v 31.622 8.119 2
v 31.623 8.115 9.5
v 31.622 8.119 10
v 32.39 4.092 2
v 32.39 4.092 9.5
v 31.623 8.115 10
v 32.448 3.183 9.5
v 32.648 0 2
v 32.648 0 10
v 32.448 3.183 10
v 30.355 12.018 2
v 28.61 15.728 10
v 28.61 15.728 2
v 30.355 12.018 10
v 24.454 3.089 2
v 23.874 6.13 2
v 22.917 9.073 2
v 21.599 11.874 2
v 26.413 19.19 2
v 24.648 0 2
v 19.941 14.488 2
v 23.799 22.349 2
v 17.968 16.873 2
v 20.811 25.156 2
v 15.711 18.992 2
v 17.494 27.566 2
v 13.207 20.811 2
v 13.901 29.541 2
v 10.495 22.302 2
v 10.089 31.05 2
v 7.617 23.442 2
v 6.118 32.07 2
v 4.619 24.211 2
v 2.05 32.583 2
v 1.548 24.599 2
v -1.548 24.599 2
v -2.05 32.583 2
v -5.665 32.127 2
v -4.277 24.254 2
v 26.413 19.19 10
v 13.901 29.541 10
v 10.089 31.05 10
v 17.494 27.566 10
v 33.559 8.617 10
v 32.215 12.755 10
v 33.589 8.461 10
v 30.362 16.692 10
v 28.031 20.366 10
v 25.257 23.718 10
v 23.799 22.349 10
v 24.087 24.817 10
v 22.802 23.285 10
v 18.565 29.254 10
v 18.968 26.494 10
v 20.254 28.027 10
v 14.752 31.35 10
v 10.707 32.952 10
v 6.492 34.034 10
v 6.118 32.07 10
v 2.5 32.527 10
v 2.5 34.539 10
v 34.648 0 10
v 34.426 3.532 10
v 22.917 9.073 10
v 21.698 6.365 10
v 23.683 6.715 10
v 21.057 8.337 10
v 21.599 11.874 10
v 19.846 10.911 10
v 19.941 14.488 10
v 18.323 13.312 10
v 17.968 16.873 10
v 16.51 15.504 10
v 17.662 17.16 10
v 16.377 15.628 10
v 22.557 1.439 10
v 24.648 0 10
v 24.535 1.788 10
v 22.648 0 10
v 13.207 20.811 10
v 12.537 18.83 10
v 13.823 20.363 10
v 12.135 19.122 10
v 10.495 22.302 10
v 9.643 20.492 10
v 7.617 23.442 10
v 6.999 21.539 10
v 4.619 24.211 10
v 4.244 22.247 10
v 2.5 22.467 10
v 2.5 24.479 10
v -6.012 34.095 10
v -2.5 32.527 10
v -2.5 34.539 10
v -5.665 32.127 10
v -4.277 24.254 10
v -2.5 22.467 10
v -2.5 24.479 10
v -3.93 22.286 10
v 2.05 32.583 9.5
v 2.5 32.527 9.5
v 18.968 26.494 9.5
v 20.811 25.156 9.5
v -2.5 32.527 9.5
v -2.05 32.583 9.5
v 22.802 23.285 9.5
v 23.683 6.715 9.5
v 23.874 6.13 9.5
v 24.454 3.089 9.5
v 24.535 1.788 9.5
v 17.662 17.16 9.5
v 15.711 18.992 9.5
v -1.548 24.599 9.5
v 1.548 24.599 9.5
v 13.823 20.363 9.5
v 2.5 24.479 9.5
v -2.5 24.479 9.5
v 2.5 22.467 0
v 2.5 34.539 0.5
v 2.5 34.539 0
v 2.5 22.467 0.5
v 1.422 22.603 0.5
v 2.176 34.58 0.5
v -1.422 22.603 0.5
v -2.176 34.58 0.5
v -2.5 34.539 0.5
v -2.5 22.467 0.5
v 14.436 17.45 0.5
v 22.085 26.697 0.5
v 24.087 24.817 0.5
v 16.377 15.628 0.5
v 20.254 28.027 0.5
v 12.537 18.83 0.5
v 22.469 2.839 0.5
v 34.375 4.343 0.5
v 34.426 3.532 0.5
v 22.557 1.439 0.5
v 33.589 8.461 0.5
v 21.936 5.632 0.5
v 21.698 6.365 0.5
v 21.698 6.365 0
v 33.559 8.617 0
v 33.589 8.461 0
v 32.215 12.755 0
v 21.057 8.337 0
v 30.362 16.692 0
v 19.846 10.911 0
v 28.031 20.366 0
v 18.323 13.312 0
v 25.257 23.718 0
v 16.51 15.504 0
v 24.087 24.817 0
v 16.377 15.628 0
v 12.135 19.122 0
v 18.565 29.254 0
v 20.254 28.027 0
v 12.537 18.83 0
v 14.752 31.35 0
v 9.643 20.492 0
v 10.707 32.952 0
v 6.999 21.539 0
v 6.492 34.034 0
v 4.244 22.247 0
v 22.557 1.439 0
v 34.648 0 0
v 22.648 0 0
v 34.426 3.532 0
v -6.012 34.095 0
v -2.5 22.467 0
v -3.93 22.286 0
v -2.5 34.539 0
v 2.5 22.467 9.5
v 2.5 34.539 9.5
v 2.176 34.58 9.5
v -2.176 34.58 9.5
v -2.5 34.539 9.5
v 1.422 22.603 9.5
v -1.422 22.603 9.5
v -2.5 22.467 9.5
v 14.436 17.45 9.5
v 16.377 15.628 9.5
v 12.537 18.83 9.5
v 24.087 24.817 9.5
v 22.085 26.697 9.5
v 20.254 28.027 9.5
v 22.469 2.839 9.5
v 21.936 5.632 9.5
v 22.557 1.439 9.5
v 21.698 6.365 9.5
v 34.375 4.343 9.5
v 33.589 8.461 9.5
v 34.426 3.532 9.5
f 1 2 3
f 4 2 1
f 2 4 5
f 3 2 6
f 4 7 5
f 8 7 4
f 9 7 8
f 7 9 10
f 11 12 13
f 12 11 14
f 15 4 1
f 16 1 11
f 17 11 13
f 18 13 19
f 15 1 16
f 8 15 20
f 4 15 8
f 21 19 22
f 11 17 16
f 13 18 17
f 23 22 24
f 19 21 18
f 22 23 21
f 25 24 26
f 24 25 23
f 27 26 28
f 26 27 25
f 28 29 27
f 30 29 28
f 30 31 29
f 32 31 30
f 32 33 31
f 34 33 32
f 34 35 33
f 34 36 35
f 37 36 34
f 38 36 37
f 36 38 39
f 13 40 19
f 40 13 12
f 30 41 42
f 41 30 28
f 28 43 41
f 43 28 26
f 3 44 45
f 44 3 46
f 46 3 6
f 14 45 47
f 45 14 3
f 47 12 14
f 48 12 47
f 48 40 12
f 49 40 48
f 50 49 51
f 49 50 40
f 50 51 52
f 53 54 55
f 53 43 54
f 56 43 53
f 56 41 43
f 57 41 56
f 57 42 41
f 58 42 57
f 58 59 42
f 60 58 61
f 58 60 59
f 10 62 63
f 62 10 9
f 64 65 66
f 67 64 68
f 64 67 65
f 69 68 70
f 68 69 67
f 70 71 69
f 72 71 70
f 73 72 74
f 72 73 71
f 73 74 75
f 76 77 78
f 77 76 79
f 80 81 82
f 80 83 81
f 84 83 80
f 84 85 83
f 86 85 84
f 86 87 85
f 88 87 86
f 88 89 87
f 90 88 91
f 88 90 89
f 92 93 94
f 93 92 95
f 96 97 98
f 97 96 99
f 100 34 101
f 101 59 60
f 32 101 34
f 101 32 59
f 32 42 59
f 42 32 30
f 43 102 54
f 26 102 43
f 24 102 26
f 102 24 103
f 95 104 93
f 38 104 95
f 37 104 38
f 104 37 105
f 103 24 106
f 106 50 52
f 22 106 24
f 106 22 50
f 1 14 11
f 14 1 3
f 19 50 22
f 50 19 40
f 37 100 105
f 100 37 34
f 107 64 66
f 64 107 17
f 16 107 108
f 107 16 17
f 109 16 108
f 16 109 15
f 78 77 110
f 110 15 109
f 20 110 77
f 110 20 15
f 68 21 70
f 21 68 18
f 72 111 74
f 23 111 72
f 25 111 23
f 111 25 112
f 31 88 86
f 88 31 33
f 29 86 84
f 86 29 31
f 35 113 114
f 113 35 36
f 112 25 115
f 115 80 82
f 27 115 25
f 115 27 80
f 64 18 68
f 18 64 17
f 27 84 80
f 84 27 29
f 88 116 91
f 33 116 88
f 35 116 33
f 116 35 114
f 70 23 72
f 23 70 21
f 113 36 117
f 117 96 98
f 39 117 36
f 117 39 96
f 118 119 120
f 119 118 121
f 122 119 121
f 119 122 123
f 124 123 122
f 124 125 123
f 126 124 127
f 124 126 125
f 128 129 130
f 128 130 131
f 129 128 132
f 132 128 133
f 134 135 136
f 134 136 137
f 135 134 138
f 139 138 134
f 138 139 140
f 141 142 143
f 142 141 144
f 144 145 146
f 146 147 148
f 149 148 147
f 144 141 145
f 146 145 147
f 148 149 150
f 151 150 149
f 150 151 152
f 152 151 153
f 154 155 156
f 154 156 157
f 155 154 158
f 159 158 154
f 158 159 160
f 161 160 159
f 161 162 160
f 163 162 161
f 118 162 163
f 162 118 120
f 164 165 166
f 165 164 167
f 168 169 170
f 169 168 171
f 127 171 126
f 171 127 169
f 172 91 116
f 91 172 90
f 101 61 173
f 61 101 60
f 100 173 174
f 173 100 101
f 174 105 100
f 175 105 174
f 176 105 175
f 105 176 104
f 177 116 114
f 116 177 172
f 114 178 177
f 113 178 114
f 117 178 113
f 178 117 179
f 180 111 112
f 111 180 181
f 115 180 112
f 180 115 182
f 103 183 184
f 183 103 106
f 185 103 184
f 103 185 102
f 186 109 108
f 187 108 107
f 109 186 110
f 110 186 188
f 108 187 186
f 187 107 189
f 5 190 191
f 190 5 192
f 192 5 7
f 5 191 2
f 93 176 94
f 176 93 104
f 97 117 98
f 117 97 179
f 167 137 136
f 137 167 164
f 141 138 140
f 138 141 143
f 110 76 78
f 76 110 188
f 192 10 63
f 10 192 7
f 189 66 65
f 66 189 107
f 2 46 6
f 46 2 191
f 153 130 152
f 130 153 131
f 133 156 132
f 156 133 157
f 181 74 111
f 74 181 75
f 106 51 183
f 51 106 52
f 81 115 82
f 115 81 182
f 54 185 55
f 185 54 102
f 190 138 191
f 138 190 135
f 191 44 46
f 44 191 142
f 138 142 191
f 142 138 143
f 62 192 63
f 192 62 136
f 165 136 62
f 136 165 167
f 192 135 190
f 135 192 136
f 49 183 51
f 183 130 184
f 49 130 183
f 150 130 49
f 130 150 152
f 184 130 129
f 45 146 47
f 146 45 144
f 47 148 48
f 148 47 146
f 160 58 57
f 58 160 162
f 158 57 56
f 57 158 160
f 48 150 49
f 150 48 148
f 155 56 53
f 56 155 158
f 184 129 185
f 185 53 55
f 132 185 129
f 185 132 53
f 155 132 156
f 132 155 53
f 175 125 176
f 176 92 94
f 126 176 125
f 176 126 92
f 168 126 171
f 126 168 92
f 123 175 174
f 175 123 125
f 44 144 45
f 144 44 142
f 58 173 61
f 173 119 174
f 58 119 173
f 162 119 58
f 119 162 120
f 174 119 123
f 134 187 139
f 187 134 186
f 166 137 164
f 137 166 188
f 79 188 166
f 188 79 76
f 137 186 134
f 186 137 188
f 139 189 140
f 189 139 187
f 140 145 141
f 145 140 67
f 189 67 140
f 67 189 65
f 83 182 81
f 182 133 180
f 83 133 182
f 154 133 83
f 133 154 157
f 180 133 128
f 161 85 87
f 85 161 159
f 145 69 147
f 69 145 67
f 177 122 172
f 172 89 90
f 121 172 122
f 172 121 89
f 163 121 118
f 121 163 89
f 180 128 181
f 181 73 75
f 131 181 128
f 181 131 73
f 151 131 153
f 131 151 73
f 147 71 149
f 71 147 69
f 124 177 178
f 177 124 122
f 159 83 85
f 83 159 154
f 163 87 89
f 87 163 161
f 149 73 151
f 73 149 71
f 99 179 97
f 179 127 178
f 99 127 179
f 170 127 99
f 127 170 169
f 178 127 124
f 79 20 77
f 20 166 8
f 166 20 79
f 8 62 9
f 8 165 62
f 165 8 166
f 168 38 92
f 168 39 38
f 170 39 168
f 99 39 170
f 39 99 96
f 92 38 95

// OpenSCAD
WIDTH = 12;
LENGTH = 50;
HEIGHT = 10;
ANGLE = 100;

GUIDE_WIDTH = 8;
GUIDE_HEIGHT = 8;

NOTCH_ANGLE = 40;
NOTCH_WIDTH = 5;
NOTCH_DEPTH = 0.5;


$fn = 50;

module guide() {
    d = (360*LENGTH)/(PI*ANGLE);
    difference() {
        cylinder(d = d + WIDTH, h = HEIGHT);
        cylinder(d = d - WIDTH, h = HEIGHT);
        translate([0, 0, HEIGHT-GUIDE_HEIGHT])
        difference() {
            cylinder(d = d + GUIDE_WIDTH, h = GUIDE_HEIGHT);
            cylinder(d = d - GUIDE_WIDTH, h = GUIDE_HEIGHT);
        }
        
        for(i = [0:360/NOTCH_ANGLE]) {
            rotate([0, 0, i * NOTCH_ANGLE])
            union() {
                translate([-NOTCH_WIDTH/2, 0, 0])
                cube(size = [NOTCH_WIDTH, d, NOTCH_DEPTH]);
                translate([-NOTCH_WIDTH/2, 0, HEIGHT-NOTCH_DEPTH])
                cube(size = [NOTCH_WIDTH, d, NOTCH_DEPTH]);
            }
        }
    }
}

module arc() {
    d = (360*LENGTH)/(PI*ANGLE);
    intersection() {
        difference() {
            guide();

            if(ANGLE < 90) {
                rotate([0, 0, -90])
                cube(size = [d, d, HEIGHT]);
            }
        }
        union() {
            for(i = [0:(ANGLE/90)-1]) {
                rotate([0, 0, i * 90])
                cube(size = [d, d, HEIGHT]);
            }
            if(ANGLE >= 90) {
                rotate([0, 0, ANGLE % 90])
                cube(size = [d, d, HEIGHT]);
            }
        }
    }
}

arc();
